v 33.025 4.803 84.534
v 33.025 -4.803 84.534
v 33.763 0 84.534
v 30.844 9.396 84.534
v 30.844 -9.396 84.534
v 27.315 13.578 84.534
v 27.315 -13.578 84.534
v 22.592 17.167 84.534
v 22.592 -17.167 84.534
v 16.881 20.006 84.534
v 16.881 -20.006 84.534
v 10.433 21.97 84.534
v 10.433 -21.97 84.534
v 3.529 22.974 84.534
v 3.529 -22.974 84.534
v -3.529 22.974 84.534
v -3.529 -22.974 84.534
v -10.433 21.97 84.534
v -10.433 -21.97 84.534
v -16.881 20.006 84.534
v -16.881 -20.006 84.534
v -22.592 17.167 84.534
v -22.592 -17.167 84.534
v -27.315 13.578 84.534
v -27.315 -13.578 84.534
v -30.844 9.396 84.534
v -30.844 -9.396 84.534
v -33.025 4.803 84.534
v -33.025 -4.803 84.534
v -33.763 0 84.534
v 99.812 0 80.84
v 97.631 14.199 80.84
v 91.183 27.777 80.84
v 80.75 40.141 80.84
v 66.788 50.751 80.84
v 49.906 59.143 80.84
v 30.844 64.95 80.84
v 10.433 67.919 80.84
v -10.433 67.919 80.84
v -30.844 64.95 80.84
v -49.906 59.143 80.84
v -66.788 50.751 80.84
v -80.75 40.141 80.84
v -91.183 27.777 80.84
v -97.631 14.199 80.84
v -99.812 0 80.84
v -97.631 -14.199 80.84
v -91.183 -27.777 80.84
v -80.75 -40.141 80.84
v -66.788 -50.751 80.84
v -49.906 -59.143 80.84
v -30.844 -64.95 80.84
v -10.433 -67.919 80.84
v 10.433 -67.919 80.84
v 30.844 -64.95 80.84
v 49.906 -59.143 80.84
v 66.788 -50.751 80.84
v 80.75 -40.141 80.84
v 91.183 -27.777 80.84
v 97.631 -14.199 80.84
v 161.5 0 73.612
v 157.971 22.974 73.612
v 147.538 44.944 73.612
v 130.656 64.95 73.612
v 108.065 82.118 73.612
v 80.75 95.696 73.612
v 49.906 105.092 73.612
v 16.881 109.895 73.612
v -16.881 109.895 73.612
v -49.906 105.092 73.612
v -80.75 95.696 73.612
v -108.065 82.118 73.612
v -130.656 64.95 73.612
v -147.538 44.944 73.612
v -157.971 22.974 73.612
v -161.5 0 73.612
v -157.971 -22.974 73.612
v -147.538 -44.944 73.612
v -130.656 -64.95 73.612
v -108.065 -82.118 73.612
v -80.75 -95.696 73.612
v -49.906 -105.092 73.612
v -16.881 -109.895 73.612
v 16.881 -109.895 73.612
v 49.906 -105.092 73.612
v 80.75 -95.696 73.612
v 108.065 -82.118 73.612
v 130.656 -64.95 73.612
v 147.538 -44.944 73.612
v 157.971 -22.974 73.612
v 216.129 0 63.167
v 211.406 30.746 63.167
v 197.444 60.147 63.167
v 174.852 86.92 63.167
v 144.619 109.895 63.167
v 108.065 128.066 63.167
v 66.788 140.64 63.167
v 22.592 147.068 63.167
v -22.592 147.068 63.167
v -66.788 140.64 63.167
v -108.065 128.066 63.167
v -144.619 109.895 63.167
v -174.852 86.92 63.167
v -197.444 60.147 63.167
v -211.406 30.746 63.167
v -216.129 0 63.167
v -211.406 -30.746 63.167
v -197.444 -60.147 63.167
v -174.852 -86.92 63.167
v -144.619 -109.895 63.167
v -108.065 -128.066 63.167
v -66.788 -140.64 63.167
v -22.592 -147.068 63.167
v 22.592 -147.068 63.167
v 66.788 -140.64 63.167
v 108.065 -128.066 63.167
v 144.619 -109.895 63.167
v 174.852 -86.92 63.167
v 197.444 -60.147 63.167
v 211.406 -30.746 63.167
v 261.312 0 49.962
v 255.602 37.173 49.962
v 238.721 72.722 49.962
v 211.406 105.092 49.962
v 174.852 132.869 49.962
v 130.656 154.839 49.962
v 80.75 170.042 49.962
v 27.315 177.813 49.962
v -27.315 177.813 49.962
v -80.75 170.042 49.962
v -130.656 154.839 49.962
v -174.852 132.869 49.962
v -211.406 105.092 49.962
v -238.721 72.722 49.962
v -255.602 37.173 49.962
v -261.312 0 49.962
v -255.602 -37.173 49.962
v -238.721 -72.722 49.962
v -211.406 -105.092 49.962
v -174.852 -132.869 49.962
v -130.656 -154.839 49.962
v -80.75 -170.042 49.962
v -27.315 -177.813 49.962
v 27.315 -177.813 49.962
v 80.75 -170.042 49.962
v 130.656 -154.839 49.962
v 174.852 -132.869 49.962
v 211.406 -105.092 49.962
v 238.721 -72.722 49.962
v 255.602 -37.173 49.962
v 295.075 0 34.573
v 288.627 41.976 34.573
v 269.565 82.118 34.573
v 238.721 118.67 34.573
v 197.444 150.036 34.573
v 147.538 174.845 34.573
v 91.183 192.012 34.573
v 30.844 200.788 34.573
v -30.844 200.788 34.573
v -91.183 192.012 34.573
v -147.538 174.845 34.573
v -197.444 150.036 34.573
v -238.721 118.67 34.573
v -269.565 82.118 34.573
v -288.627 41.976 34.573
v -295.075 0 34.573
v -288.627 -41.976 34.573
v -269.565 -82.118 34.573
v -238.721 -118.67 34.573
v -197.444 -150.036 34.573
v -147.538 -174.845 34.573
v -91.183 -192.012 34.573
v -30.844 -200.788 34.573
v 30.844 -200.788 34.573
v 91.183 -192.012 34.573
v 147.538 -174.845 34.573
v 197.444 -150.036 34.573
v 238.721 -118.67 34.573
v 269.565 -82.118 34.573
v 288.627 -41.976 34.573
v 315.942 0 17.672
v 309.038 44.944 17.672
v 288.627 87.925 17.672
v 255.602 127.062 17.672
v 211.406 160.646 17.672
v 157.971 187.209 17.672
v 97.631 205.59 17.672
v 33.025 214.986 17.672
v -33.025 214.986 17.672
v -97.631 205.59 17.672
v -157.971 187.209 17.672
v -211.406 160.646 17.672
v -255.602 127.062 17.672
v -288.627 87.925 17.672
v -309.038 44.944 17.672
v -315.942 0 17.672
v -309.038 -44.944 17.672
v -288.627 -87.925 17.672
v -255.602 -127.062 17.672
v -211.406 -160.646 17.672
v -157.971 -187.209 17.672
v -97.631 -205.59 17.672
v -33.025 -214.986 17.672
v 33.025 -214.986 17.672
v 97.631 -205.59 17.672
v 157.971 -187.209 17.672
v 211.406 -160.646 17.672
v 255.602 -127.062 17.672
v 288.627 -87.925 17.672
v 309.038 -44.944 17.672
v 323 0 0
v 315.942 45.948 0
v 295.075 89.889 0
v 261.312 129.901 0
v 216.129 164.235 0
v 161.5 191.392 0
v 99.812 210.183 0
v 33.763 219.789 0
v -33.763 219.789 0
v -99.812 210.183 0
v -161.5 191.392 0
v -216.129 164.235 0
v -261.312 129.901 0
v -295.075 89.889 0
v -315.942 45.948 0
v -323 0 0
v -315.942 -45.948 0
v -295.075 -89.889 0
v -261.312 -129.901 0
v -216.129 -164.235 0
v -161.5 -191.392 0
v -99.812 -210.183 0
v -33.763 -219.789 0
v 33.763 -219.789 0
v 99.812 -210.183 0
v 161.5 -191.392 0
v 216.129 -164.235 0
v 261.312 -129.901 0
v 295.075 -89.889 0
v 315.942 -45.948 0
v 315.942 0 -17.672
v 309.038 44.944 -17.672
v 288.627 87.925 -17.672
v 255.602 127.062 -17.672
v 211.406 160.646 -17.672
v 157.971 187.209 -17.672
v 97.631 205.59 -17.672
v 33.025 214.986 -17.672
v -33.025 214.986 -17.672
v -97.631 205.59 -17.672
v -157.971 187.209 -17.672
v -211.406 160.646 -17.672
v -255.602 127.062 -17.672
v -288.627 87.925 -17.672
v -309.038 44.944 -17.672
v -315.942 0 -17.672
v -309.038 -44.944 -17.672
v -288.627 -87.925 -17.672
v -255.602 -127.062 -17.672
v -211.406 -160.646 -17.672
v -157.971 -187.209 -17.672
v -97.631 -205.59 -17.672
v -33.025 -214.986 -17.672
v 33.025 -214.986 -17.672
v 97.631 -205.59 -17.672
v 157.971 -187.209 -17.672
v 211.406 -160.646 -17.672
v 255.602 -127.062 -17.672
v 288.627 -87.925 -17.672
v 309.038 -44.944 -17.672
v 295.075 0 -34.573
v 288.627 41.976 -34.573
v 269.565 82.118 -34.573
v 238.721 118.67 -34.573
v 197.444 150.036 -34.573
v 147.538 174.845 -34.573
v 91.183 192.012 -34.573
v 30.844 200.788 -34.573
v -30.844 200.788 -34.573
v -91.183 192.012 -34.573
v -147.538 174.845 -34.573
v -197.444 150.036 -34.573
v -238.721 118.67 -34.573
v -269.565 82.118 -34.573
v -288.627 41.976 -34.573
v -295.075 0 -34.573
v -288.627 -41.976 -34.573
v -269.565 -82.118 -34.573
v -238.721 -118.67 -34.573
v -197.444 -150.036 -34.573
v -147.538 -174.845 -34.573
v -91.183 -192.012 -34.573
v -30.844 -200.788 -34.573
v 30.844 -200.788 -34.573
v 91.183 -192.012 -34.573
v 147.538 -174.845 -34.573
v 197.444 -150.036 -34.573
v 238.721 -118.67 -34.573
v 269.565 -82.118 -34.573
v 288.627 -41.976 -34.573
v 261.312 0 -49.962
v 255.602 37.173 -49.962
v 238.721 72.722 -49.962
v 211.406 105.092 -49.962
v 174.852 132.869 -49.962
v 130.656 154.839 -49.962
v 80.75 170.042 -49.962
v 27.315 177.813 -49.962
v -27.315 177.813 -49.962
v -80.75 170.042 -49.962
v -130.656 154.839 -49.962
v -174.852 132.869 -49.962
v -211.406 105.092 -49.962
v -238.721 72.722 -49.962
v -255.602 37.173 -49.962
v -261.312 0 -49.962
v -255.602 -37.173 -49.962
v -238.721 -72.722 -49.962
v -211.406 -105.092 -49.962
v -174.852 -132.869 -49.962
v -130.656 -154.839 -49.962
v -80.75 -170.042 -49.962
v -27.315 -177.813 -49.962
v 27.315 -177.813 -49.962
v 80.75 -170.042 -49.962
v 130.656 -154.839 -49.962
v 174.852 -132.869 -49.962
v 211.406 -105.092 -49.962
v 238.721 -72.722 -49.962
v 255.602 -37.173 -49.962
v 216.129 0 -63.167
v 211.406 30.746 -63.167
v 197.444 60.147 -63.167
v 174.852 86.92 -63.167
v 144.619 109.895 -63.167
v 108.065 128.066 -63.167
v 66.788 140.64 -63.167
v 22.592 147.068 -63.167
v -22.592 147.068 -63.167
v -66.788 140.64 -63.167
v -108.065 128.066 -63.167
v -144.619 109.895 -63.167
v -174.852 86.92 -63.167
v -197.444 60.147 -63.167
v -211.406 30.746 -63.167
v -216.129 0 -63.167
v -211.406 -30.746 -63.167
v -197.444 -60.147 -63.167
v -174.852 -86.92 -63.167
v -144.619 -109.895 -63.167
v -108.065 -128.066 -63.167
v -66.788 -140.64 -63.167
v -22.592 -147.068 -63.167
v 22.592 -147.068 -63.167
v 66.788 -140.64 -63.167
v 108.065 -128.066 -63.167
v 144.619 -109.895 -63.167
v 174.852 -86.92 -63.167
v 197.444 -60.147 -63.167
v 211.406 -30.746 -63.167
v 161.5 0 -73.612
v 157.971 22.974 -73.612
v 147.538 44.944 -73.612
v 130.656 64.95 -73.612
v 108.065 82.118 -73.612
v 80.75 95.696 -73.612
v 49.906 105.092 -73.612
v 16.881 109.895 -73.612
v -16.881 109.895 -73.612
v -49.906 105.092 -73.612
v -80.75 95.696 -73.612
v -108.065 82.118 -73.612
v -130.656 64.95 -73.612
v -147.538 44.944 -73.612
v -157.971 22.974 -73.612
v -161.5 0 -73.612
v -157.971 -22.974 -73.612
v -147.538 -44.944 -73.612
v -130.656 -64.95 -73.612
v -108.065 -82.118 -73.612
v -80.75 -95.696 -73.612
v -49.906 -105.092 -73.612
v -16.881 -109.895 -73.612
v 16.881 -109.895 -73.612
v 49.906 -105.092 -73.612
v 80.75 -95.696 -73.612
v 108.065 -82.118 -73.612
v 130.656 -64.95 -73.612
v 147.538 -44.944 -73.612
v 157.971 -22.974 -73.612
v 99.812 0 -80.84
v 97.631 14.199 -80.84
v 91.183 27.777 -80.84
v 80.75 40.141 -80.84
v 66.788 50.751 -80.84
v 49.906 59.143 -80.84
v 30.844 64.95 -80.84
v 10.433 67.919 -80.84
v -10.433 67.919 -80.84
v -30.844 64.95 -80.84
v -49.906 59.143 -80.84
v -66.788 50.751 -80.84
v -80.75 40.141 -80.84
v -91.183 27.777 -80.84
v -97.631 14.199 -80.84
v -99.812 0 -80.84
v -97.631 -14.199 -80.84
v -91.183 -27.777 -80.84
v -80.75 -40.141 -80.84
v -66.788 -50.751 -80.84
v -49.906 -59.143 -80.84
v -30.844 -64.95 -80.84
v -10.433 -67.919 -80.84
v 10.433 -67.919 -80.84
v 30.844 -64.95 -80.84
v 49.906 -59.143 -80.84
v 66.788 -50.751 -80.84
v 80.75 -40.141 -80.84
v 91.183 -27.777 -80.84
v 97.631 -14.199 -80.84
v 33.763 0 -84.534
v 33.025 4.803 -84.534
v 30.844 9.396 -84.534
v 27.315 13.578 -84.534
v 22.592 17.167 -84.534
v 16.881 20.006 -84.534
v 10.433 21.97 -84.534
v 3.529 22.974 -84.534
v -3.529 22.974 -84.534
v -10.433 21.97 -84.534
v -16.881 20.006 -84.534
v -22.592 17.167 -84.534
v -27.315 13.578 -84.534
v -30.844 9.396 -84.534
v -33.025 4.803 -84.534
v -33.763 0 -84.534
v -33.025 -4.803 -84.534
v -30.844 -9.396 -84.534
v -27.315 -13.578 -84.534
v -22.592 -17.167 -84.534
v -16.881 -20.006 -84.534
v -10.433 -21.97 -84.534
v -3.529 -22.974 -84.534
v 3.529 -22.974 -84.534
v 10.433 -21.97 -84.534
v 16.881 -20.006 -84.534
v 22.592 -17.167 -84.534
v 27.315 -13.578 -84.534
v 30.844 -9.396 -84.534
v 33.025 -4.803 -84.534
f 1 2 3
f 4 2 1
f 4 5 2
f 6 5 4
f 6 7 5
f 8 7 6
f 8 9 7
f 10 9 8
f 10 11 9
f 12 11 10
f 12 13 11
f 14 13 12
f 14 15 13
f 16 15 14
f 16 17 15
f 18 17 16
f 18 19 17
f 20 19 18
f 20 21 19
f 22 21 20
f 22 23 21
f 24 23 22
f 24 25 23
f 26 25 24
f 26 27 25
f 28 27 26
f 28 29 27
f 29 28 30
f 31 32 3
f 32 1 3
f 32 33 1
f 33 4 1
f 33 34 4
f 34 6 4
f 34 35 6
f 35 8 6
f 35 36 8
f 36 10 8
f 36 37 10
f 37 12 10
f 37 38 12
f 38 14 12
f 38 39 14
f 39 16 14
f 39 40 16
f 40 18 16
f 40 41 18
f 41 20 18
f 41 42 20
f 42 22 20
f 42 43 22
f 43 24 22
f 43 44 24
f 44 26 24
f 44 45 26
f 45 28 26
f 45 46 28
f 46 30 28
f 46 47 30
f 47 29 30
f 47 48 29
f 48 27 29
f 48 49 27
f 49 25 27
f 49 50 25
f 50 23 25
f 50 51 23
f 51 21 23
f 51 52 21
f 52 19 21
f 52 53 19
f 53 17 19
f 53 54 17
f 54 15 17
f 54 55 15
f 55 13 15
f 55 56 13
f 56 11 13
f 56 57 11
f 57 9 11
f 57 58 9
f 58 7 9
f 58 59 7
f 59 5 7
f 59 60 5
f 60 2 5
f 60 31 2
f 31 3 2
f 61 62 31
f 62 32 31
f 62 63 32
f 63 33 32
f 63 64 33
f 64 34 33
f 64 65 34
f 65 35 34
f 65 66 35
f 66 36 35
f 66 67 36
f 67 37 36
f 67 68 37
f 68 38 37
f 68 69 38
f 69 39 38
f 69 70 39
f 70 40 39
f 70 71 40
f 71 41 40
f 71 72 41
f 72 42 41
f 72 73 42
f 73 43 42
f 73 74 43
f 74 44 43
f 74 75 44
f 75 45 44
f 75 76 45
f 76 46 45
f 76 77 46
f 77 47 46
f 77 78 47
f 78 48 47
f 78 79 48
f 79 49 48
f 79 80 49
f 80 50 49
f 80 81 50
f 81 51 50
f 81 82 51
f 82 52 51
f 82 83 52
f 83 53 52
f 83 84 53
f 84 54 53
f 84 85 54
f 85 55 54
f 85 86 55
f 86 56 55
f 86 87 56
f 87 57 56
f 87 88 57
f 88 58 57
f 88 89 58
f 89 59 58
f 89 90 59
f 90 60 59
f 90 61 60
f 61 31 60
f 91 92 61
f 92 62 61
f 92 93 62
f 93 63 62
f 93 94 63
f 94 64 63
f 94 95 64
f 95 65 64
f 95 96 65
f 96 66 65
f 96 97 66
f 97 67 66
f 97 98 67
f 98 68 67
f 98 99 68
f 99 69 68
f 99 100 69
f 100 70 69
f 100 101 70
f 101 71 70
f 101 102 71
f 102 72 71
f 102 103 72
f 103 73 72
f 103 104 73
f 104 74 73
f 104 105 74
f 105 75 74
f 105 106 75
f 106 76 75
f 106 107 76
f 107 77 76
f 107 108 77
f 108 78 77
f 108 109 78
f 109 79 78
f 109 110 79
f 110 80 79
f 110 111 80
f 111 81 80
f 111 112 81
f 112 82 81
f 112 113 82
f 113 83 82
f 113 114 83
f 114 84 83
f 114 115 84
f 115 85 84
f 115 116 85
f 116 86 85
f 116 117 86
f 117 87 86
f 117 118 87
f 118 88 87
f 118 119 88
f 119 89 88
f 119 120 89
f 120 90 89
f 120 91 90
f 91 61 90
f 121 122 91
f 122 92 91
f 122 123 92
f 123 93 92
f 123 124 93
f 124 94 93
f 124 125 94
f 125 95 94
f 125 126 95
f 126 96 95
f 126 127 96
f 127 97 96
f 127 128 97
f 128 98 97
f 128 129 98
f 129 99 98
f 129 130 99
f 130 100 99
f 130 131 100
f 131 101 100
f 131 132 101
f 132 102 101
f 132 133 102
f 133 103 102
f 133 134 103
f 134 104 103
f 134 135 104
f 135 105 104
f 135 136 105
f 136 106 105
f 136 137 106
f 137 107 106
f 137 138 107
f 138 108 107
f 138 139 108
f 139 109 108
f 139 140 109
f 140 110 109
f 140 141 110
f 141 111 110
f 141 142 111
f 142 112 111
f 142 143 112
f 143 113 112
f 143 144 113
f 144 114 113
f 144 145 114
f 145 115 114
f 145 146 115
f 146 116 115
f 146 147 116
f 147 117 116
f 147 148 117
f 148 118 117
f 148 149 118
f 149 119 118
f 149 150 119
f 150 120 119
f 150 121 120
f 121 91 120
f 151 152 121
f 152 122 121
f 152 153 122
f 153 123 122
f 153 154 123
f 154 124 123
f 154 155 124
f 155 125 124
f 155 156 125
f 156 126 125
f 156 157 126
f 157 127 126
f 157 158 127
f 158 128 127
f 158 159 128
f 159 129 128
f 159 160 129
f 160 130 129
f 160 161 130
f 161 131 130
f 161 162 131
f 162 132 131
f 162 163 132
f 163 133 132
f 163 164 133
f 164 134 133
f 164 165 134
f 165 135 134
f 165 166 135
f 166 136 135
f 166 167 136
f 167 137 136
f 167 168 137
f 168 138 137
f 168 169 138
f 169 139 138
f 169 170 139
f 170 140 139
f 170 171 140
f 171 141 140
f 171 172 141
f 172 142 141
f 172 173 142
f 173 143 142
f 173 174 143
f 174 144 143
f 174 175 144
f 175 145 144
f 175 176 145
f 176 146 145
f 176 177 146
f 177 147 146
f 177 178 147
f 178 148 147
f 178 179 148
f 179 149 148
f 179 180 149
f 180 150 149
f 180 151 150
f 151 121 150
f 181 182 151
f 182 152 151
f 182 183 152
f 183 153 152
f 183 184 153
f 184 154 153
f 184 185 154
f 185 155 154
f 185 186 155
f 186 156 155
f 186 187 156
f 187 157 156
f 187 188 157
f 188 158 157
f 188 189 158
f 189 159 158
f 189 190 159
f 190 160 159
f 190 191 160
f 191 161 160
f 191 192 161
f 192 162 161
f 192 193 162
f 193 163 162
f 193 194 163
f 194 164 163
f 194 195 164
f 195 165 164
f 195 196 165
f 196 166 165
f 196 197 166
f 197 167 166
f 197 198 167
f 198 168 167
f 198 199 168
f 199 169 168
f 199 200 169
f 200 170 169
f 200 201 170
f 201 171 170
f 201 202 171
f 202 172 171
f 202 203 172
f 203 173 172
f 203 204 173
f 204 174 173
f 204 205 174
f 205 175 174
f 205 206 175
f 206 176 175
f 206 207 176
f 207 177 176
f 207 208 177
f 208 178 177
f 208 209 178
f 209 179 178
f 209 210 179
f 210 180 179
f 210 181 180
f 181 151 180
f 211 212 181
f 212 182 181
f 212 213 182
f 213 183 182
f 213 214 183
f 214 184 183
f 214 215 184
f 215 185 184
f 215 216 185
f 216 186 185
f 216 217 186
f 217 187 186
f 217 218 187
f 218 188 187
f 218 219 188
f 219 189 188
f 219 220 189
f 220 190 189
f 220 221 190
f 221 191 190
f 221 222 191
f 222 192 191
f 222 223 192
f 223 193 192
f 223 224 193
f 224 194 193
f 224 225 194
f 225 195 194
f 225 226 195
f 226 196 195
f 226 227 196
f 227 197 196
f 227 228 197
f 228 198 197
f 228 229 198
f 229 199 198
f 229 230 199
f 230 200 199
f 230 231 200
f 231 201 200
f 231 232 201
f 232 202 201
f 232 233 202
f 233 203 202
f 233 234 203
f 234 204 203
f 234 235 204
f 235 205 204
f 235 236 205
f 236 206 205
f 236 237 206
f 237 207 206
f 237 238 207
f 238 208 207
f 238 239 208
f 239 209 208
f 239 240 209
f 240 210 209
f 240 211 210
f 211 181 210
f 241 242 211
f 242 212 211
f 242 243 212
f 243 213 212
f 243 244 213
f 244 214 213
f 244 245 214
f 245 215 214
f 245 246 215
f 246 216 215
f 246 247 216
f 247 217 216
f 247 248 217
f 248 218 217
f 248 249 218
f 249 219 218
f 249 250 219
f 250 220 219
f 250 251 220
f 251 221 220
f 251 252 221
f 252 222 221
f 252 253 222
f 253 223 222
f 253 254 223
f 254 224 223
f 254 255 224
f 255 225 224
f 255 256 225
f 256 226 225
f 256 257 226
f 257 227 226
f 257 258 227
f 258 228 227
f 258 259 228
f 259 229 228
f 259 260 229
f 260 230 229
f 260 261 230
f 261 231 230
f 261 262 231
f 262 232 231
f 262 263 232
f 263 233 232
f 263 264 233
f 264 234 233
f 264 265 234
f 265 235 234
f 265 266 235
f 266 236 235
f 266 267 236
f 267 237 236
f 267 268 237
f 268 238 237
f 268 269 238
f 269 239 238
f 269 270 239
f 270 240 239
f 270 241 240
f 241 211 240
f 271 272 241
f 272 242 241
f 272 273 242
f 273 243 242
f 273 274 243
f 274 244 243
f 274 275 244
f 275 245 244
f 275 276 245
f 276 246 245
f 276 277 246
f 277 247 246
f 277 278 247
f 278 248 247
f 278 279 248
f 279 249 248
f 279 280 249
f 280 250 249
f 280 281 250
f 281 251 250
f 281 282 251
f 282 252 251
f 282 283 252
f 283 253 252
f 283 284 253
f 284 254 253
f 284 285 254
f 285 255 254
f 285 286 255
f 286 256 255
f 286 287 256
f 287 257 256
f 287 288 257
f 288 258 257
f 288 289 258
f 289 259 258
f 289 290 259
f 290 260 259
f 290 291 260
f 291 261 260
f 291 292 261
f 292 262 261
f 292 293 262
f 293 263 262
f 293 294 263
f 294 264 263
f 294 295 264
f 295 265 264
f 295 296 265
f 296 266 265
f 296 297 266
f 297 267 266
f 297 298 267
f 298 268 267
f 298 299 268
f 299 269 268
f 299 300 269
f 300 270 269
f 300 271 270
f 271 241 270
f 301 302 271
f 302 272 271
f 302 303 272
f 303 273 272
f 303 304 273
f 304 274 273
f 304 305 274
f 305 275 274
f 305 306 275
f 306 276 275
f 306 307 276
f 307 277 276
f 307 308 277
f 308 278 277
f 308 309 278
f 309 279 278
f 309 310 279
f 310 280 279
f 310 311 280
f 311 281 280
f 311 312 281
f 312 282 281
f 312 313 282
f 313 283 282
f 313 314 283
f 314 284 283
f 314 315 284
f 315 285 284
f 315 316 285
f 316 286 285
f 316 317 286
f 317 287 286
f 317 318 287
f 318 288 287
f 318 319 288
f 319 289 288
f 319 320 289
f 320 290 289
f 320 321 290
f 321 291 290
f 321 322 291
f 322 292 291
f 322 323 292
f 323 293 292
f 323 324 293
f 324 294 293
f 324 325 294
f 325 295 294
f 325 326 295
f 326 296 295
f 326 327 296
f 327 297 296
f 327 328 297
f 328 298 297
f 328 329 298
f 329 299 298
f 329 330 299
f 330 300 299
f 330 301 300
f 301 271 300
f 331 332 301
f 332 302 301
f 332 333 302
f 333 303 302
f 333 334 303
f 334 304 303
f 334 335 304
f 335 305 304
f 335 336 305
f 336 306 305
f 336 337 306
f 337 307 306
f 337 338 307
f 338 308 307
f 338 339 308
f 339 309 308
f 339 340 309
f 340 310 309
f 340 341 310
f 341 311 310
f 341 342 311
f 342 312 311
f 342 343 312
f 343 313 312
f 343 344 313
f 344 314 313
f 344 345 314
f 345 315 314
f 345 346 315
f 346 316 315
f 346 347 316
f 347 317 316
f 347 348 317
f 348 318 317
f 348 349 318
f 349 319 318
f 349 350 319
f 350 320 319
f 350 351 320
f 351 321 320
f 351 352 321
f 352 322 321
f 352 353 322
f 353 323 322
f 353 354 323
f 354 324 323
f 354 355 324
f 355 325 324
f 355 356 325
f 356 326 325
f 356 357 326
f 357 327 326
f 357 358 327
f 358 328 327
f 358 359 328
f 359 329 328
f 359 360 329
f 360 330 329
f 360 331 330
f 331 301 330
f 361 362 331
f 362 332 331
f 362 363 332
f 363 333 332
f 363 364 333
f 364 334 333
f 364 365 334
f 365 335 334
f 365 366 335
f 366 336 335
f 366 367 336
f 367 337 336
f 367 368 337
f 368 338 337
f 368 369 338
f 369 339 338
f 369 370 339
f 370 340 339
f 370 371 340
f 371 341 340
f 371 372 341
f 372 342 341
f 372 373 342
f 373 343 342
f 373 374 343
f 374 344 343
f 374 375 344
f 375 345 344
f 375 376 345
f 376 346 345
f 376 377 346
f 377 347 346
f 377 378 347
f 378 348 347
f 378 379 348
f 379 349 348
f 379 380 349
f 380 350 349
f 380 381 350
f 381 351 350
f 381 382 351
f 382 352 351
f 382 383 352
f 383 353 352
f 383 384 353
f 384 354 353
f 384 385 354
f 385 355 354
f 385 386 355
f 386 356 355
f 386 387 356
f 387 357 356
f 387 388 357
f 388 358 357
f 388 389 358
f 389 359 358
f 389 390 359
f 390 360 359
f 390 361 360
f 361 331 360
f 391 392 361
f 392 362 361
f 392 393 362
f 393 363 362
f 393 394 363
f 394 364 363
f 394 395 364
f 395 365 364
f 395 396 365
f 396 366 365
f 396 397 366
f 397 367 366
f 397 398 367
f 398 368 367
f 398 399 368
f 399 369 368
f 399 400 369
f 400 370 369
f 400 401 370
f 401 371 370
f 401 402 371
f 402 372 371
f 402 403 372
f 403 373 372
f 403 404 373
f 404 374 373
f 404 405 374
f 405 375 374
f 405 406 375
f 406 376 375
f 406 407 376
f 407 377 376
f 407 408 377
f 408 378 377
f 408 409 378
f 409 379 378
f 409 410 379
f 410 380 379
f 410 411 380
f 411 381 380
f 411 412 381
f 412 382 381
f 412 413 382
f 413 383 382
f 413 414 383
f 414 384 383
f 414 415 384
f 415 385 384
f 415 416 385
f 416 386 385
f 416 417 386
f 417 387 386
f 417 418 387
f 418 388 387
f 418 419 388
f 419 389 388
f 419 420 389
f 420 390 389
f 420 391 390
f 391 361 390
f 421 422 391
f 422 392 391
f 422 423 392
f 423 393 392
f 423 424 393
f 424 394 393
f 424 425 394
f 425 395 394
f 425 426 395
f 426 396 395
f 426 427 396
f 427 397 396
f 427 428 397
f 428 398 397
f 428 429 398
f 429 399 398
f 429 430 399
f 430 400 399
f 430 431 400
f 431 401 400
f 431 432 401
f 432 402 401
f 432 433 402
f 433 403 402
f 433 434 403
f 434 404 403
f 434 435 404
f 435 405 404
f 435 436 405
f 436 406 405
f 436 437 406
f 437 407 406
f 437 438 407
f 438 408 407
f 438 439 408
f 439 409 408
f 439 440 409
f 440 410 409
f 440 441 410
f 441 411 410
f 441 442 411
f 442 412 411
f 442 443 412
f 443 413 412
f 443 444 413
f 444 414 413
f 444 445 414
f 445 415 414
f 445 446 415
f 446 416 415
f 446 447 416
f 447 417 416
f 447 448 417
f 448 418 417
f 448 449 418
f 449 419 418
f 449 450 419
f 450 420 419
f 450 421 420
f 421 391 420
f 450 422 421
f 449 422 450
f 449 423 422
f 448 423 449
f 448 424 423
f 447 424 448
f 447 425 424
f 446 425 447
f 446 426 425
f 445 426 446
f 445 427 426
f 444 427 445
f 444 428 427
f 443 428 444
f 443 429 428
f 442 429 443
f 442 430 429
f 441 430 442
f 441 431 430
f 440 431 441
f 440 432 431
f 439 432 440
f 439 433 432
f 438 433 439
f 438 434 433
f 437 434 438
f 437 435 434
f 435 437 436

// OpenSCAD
// Generated by SolidPython 1.0.1 on 2020-07-29 00:46:54


scale(v = [19, 13, 5]) {
	sphere(r = 17);
}
/***********************************************
*********      SolidPython code:      **********
************************************************
 
# import packages: SolidPython
from solid import *
from solid.utils import *
from itertools import chain, combinations, permutations


class Resize:

    def __init__(self, scad_file):
        self.scad_file = scad_file
        #self.scad_file = import_scad(scad_file)
        # cone/cylinder param:
        self.r1 = 0
        self.r2 = 0
        self.h = 0
        # rectangular prism param:
        self.w = 0
        self.l = 0
        # ellipse param:
        self.r = 0

    # import OpenScad code (file name corresponds to shape)


    # classify shape + parameters
    def assign(self, param1, param2, param3):
        if self.scad_file == 'cone.scad':
            self.r1 = param1
            self.r2 = param2
            self.h = param3
        elif self.scad_file == 'cylinder.scad':
            self.r1 = param1
            self.r2 = param2
            self.h = param3
        elif self.scad_file == 'rectangularPrism.scad':
            self.h = param1
            self.l = param2
            self.w = param3
        else:
            self.r = param1
            self.h = param2

    # resize parameters
    def iterate(self):
        x = range(3, 20, 2)
        i = 1
        if self.scad_file == 'cone.scad':
            tempList = list(permutations(x, 2))
            for temp in tempList:
                param1 = temp[0]
                param2 = temp[1]
                filepath = 'produced_scad_files/' + 'cone' + str(param1) + '_' + str(param2) + '_' + '.scad'
                scad_render_to_file(cylinder(h=param1, r1=param2, r2=0), filepath)

        elif self.scad_file == 'cylinder.scad':
            tempList = list(permutations(x, 3))
            for temp in tempList:
                param1 = temp[0]
                param2 = temp[1]
                filepath = 'produced_scad_files/' + 'cylinder' + str(param1) + '_' + str(param2) + '_' + '.scad'
                scad_render_to_file(cylinder(h=param1, r1=param2, r2=param2), filepath)

        elif self.scad_file == 'rectangularPrism.scad':
            tempList = list(permutations(x, 3))
            for temp in tempList:
                param1 = temp[0]
                param2 = temp[1]
                param3 = temp[2]
                filepath = 'produced_scad_files/' + 'rectangularPrism' + str(param1) + '_' + str(param2) + '_' + str(
                    param3) + '.scad'
                scad_render_to_file(cube(size=(param1, param2, param3)), filepath)

        elif self.scad_file == 'ellipse.scad':
            tempList = list(permutations(x, 4))
            for temp in tempList:
                param1 = temp[0]
                param2 = temp[1]
                param3 = temp[2]
                param4 = temp[3]
                filepath = 'produced_scad_files/' + 'ellipse' + str(param1) + '_' + str(param2) + '_' + str(param3) + '_' + str(param4) + '.scad'
                scad_render_to_file(scale([param1, param2, param3])(sphere(r=param4)), filepath)

    def render_to_scadfile(self):
        scad_render_to_file(scad, 'example.scad') 
 
************************************************/
